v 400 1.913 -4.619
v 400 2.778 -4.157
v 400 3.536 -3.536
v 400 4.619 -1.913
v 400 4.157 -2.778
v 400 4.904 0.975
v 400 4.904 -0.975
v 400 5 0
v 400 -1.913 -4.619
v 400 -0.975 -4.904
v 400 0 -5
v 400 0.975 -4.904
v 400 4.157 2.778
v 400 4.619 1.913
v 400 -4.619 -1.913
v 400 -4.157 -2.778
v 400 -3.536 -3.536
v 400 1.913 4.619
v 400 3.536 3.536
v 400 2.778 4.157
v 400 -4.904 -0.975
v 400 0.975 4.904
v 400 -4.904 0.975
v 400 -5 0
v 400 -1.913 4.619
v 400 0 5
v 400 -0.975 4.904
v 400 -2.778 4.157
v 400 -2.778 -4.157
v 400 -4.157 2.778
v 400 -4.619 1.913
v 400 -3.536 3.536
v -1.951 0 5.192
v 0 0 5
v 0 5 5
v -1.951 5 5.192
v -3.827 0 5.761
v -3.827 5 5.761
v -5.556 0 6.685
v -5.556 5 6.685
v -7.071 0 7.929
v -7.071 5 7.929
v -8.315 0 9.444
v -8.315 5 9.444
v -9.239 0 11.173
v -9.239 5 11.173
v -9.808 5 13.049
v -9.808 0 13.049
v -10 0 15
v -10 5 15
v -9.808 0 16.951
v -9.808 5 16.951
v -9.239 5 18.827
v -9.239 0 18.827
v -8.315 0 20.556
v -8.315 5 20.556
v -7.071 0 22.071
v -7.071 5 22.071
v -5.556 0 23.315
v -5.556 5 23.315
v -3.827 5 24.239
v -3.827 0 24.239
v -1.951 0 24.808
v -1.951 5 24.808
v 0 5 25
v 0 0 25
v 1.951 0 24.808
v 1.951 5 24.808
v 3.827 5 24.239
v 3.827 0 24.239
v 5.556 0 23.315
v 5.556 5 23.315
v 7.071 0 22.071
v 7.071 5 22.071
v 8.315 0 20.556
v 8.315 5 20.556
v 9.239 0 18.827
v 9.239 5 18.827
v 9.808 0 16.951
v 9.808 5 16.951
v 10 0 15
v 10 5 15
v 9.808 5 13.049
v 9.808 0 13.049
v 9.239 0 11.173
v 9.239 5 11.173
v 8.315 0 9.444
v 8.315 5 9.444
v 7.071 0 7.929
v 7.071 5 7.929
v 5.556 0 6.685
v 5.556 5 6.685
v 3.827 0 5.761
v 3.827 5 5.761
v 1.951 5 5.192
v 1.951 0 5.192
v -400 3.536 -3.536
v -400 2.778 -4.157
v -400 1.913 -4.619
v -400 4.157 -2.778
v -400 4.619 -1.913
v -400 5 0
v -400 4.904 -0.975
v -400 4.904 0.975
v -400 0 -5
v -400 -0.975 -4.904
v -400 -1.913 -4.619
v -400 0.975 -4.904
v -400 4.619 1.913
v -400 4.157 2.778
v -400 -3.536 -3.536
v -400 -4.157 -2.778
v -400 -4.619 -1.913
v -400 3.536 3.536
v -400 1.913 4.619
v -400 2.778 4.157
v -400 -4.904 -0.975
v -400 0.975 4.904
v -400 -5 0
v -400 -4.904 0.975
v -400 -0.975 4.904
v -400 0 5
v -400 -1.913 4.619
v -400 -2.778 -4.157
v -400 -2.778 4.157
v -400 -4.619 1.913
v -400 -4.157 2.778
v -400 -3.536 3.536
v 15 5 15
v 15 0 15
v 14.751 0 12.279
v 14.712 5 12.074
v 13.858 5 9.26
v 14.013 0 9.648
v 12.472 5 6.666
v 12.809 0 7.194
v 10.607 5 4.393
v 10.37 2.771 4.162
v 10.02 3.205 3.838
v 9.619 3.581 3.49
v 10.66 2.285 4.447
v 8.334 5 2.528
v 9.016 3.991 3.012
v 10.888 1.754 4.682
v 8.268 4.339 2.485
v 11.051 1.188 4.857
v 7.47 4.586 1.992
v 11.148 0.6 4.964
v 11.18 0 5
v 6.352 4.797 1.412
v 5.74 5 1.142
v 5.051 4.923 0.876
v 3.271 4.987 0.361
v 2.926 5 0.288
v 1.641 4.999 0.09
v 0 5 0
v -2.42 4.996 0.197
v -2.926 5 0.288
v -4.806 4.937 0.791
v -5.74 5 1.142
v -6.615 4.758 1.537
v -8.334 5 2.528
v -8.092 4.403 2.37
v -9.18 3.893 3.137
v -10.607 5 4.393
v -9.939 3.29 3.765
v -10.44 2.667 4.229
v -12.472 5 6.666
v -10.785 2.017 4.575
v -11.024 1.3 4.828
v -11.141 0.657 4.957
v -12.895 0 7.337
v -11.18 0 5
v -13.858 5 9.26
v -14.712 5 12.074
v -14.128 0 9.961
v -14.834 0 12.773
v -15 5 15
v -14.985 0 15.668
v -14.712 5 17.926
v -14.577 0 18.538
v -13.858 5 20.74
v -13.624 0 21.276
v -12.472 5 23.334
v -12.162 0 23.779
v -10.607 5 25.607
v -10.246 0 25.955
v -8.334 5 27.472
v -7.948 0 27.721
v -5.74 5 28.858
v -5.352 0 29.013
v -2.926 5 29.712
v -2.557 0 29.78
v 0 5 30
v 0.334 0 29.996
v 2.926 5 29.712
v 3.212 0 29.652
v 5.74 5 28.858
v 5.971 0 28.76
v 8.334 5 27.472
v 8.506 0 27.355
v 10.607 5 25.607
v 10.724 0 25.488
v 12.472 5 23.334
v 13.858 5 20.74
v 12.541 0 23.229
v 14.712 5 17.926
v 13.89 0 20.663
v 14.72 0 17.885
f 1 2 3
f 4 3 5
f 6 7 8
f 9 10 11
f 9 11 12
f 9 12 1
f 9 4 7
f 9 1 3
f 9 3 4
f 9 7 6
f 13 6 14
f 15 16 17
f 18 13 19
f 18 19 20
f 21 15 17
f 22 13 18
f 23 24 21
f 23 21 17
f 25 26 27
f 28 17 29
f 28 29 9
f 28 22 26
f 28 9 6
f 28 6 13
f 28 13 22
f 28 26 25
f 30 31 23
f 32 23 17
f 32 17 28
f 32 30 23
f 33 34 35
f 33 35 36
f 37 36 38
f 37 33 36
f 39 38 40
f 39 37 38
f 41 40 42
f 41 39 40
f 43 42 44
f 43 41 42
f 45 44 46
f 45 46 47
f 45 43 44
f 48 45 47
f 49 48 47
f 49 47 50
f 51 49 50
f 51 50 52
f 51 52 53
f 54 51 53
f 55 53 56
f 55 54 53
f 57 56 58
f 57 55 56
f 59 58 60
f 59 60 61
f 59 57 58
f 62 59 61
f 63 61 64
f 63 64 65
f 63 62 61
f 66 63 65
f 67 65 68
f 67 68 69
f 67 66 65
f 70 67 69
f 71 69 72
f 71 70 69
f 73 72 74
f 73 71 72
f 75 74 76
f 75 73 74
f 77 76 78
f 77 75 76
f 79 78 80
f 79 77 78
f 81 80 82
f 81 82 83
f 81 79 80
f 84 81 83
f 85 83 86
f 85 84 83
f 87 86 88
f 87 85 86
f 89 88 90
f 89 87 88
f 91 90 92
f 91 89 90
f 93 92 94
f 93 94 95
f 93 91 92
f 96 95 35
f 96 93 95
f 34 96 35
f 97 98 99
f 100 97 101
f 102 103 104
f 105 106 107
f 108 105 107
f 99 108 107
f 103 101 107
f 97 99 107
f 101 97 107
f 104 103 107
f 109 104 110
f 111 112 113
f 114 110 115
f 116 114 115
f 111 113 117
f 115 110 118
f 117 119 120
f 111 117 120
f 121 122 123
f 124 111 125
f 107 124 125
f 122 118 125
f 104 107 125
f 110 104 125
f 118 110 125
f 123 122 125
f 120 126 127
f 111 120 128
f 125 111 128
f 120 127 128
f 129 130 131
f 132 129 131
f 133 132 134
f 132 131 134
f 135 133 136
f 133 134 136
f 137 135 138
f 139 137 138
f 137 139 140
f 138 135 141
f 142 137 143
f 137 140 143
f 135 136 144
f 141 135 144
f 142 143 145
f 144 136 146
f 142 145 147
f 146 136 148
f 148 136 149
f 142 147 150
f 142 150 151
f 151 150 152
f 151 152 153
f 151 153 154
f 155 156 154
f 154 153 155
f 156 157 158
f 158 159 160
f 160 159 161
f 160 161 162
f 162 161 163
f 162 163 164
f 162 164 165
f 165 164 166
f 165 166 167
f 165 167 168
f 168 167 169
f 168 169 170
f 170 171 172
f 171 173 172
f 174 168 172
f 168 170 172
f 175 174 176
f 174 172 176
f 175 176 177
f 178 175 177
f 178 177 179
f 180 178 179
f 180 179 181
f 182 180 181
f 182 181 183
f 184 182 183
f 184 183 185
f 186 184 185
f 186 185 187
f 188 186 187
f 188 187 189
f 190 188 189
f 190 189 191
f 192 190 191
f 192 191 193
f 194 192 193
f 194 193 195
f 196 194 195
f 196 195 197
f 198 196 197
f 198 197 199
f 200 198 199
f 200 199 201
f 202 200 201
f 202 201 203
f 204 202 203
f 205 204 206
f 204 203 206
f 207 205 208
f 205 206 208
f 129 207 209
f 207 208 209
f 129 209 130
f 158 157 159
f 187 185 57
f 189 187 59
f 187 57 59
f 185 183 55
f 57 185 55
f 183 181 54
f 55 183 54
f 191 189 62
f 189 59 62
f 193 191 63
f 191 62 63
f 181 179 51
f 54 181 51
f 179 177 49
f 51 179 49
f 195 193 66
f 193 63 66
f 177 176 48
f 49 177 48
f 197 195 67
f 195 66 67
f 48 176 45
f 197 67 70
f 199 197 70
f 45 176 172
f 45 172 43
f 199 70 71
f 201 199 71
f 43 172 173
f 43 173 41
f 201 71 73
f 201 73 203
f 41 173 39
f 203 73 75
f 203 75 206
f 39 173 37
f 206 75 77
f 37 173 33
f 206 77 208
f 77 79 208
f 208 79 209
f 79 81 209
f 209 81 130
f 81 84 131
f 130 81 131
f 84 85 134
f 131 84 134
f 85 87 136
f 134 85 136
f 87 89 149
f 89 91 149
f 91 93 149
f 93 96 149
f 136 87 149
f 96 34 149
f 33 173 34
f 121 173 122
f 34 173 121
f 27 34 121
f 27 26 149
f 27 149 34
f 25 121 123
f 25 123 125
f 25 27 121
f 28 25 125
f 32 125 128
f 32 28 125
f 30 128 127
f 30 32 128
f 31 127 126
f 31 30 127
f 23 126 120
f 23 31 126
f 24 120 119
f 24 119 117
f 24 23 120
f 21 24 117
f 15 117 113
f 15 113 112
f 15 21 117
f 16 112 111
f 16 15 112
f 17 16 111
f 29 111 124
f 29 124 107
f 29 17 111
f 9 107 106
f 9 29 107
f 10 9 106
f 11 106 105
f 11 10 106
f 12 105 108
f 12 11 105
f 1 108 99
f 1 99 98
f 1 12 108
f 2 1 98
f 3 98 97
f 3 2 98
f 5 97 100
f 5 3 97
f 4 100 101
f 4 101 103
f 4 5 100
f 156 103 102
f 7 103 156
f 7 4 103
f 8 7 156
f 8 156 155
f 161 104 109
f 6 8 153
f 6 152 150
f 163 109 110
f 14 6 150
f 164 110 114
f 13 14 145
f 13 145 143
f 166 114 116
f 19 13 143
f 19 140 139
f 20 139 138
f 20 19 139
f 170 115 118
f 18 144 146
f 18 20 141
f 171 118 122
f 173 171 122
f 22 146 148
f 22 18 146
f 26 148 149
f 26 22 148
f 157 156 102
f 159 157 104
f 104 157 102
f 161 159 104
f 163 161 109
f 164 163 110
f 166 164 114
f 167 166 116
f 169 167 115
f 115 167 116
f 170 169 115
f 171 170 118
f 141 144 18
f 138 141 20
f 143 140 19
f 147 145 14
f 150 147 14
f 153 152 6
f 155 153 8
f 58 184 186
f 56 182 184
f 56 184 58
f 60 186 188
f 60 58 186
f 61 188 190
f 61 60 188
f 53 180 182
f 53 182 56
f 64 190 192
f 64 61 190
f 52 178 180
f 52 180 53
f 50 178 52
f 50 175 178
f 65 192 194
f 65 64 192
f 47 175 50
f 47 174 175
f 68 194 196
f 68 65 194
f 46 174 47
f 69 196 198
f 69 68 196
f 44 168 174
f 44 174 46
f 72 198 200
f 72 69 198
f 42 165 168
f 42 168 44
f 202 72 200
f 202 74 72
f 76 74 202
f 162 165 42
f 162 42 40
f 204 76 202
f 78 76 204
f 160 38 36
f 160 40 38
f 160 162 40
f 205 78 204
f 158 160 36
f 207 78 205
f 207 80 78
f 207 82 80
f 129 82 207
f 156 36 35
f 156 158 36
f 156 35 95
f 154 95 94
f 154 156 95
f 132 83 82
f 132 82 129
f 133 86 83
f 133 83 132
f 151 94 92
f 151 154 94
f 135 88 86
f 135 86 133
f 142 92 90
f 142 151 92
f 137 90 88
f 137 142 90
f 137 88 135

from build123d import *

# Parameters (mm, degrees)
BALAYAGE1_PROFILE_R = 5
ESQUISSE2_R         = 15
ESQUISSE2_R_2       = 10
BOSS_EXTRU_1_DEPTH  = 5


with BuildPart() as part:
    # Balayage1: sweep along a path in Esquisse1
    with BuildLine(Plane.XY) as balayage1_path:
        Line((-400, 0), (400, 0))
    # Balayage1 profile (on start of the path) → Balayage1 (sweep)
    with BuildSketch(Plane(origin=(-400, 0, 0), x_dir=(0, 0, 1), z_dir=(1, 0, 0))):
        Circle(BALAYAGE1_PROFILE_R)
    sweep(path=balayage1_path.line)

    # Esquisse2 → Boss.-Extru.1 (add)
    with BuildSketch(Plane(origin=(0, 0, 0), x_dir=(1, 0, 0), z_dir=(0, 1, 0))):
        with Locations((0, -15)):
            Circle(ESQUISSE2_R)
        with Locations(Location((0, -15, 0), (0, 0, 90))):
            Circle(ESQUISSE2_R_2, mode=Mode.SUBTRACT)
    extrude(amount=BOSS_EXTRU_1_DEPTH)


solid = part.part
